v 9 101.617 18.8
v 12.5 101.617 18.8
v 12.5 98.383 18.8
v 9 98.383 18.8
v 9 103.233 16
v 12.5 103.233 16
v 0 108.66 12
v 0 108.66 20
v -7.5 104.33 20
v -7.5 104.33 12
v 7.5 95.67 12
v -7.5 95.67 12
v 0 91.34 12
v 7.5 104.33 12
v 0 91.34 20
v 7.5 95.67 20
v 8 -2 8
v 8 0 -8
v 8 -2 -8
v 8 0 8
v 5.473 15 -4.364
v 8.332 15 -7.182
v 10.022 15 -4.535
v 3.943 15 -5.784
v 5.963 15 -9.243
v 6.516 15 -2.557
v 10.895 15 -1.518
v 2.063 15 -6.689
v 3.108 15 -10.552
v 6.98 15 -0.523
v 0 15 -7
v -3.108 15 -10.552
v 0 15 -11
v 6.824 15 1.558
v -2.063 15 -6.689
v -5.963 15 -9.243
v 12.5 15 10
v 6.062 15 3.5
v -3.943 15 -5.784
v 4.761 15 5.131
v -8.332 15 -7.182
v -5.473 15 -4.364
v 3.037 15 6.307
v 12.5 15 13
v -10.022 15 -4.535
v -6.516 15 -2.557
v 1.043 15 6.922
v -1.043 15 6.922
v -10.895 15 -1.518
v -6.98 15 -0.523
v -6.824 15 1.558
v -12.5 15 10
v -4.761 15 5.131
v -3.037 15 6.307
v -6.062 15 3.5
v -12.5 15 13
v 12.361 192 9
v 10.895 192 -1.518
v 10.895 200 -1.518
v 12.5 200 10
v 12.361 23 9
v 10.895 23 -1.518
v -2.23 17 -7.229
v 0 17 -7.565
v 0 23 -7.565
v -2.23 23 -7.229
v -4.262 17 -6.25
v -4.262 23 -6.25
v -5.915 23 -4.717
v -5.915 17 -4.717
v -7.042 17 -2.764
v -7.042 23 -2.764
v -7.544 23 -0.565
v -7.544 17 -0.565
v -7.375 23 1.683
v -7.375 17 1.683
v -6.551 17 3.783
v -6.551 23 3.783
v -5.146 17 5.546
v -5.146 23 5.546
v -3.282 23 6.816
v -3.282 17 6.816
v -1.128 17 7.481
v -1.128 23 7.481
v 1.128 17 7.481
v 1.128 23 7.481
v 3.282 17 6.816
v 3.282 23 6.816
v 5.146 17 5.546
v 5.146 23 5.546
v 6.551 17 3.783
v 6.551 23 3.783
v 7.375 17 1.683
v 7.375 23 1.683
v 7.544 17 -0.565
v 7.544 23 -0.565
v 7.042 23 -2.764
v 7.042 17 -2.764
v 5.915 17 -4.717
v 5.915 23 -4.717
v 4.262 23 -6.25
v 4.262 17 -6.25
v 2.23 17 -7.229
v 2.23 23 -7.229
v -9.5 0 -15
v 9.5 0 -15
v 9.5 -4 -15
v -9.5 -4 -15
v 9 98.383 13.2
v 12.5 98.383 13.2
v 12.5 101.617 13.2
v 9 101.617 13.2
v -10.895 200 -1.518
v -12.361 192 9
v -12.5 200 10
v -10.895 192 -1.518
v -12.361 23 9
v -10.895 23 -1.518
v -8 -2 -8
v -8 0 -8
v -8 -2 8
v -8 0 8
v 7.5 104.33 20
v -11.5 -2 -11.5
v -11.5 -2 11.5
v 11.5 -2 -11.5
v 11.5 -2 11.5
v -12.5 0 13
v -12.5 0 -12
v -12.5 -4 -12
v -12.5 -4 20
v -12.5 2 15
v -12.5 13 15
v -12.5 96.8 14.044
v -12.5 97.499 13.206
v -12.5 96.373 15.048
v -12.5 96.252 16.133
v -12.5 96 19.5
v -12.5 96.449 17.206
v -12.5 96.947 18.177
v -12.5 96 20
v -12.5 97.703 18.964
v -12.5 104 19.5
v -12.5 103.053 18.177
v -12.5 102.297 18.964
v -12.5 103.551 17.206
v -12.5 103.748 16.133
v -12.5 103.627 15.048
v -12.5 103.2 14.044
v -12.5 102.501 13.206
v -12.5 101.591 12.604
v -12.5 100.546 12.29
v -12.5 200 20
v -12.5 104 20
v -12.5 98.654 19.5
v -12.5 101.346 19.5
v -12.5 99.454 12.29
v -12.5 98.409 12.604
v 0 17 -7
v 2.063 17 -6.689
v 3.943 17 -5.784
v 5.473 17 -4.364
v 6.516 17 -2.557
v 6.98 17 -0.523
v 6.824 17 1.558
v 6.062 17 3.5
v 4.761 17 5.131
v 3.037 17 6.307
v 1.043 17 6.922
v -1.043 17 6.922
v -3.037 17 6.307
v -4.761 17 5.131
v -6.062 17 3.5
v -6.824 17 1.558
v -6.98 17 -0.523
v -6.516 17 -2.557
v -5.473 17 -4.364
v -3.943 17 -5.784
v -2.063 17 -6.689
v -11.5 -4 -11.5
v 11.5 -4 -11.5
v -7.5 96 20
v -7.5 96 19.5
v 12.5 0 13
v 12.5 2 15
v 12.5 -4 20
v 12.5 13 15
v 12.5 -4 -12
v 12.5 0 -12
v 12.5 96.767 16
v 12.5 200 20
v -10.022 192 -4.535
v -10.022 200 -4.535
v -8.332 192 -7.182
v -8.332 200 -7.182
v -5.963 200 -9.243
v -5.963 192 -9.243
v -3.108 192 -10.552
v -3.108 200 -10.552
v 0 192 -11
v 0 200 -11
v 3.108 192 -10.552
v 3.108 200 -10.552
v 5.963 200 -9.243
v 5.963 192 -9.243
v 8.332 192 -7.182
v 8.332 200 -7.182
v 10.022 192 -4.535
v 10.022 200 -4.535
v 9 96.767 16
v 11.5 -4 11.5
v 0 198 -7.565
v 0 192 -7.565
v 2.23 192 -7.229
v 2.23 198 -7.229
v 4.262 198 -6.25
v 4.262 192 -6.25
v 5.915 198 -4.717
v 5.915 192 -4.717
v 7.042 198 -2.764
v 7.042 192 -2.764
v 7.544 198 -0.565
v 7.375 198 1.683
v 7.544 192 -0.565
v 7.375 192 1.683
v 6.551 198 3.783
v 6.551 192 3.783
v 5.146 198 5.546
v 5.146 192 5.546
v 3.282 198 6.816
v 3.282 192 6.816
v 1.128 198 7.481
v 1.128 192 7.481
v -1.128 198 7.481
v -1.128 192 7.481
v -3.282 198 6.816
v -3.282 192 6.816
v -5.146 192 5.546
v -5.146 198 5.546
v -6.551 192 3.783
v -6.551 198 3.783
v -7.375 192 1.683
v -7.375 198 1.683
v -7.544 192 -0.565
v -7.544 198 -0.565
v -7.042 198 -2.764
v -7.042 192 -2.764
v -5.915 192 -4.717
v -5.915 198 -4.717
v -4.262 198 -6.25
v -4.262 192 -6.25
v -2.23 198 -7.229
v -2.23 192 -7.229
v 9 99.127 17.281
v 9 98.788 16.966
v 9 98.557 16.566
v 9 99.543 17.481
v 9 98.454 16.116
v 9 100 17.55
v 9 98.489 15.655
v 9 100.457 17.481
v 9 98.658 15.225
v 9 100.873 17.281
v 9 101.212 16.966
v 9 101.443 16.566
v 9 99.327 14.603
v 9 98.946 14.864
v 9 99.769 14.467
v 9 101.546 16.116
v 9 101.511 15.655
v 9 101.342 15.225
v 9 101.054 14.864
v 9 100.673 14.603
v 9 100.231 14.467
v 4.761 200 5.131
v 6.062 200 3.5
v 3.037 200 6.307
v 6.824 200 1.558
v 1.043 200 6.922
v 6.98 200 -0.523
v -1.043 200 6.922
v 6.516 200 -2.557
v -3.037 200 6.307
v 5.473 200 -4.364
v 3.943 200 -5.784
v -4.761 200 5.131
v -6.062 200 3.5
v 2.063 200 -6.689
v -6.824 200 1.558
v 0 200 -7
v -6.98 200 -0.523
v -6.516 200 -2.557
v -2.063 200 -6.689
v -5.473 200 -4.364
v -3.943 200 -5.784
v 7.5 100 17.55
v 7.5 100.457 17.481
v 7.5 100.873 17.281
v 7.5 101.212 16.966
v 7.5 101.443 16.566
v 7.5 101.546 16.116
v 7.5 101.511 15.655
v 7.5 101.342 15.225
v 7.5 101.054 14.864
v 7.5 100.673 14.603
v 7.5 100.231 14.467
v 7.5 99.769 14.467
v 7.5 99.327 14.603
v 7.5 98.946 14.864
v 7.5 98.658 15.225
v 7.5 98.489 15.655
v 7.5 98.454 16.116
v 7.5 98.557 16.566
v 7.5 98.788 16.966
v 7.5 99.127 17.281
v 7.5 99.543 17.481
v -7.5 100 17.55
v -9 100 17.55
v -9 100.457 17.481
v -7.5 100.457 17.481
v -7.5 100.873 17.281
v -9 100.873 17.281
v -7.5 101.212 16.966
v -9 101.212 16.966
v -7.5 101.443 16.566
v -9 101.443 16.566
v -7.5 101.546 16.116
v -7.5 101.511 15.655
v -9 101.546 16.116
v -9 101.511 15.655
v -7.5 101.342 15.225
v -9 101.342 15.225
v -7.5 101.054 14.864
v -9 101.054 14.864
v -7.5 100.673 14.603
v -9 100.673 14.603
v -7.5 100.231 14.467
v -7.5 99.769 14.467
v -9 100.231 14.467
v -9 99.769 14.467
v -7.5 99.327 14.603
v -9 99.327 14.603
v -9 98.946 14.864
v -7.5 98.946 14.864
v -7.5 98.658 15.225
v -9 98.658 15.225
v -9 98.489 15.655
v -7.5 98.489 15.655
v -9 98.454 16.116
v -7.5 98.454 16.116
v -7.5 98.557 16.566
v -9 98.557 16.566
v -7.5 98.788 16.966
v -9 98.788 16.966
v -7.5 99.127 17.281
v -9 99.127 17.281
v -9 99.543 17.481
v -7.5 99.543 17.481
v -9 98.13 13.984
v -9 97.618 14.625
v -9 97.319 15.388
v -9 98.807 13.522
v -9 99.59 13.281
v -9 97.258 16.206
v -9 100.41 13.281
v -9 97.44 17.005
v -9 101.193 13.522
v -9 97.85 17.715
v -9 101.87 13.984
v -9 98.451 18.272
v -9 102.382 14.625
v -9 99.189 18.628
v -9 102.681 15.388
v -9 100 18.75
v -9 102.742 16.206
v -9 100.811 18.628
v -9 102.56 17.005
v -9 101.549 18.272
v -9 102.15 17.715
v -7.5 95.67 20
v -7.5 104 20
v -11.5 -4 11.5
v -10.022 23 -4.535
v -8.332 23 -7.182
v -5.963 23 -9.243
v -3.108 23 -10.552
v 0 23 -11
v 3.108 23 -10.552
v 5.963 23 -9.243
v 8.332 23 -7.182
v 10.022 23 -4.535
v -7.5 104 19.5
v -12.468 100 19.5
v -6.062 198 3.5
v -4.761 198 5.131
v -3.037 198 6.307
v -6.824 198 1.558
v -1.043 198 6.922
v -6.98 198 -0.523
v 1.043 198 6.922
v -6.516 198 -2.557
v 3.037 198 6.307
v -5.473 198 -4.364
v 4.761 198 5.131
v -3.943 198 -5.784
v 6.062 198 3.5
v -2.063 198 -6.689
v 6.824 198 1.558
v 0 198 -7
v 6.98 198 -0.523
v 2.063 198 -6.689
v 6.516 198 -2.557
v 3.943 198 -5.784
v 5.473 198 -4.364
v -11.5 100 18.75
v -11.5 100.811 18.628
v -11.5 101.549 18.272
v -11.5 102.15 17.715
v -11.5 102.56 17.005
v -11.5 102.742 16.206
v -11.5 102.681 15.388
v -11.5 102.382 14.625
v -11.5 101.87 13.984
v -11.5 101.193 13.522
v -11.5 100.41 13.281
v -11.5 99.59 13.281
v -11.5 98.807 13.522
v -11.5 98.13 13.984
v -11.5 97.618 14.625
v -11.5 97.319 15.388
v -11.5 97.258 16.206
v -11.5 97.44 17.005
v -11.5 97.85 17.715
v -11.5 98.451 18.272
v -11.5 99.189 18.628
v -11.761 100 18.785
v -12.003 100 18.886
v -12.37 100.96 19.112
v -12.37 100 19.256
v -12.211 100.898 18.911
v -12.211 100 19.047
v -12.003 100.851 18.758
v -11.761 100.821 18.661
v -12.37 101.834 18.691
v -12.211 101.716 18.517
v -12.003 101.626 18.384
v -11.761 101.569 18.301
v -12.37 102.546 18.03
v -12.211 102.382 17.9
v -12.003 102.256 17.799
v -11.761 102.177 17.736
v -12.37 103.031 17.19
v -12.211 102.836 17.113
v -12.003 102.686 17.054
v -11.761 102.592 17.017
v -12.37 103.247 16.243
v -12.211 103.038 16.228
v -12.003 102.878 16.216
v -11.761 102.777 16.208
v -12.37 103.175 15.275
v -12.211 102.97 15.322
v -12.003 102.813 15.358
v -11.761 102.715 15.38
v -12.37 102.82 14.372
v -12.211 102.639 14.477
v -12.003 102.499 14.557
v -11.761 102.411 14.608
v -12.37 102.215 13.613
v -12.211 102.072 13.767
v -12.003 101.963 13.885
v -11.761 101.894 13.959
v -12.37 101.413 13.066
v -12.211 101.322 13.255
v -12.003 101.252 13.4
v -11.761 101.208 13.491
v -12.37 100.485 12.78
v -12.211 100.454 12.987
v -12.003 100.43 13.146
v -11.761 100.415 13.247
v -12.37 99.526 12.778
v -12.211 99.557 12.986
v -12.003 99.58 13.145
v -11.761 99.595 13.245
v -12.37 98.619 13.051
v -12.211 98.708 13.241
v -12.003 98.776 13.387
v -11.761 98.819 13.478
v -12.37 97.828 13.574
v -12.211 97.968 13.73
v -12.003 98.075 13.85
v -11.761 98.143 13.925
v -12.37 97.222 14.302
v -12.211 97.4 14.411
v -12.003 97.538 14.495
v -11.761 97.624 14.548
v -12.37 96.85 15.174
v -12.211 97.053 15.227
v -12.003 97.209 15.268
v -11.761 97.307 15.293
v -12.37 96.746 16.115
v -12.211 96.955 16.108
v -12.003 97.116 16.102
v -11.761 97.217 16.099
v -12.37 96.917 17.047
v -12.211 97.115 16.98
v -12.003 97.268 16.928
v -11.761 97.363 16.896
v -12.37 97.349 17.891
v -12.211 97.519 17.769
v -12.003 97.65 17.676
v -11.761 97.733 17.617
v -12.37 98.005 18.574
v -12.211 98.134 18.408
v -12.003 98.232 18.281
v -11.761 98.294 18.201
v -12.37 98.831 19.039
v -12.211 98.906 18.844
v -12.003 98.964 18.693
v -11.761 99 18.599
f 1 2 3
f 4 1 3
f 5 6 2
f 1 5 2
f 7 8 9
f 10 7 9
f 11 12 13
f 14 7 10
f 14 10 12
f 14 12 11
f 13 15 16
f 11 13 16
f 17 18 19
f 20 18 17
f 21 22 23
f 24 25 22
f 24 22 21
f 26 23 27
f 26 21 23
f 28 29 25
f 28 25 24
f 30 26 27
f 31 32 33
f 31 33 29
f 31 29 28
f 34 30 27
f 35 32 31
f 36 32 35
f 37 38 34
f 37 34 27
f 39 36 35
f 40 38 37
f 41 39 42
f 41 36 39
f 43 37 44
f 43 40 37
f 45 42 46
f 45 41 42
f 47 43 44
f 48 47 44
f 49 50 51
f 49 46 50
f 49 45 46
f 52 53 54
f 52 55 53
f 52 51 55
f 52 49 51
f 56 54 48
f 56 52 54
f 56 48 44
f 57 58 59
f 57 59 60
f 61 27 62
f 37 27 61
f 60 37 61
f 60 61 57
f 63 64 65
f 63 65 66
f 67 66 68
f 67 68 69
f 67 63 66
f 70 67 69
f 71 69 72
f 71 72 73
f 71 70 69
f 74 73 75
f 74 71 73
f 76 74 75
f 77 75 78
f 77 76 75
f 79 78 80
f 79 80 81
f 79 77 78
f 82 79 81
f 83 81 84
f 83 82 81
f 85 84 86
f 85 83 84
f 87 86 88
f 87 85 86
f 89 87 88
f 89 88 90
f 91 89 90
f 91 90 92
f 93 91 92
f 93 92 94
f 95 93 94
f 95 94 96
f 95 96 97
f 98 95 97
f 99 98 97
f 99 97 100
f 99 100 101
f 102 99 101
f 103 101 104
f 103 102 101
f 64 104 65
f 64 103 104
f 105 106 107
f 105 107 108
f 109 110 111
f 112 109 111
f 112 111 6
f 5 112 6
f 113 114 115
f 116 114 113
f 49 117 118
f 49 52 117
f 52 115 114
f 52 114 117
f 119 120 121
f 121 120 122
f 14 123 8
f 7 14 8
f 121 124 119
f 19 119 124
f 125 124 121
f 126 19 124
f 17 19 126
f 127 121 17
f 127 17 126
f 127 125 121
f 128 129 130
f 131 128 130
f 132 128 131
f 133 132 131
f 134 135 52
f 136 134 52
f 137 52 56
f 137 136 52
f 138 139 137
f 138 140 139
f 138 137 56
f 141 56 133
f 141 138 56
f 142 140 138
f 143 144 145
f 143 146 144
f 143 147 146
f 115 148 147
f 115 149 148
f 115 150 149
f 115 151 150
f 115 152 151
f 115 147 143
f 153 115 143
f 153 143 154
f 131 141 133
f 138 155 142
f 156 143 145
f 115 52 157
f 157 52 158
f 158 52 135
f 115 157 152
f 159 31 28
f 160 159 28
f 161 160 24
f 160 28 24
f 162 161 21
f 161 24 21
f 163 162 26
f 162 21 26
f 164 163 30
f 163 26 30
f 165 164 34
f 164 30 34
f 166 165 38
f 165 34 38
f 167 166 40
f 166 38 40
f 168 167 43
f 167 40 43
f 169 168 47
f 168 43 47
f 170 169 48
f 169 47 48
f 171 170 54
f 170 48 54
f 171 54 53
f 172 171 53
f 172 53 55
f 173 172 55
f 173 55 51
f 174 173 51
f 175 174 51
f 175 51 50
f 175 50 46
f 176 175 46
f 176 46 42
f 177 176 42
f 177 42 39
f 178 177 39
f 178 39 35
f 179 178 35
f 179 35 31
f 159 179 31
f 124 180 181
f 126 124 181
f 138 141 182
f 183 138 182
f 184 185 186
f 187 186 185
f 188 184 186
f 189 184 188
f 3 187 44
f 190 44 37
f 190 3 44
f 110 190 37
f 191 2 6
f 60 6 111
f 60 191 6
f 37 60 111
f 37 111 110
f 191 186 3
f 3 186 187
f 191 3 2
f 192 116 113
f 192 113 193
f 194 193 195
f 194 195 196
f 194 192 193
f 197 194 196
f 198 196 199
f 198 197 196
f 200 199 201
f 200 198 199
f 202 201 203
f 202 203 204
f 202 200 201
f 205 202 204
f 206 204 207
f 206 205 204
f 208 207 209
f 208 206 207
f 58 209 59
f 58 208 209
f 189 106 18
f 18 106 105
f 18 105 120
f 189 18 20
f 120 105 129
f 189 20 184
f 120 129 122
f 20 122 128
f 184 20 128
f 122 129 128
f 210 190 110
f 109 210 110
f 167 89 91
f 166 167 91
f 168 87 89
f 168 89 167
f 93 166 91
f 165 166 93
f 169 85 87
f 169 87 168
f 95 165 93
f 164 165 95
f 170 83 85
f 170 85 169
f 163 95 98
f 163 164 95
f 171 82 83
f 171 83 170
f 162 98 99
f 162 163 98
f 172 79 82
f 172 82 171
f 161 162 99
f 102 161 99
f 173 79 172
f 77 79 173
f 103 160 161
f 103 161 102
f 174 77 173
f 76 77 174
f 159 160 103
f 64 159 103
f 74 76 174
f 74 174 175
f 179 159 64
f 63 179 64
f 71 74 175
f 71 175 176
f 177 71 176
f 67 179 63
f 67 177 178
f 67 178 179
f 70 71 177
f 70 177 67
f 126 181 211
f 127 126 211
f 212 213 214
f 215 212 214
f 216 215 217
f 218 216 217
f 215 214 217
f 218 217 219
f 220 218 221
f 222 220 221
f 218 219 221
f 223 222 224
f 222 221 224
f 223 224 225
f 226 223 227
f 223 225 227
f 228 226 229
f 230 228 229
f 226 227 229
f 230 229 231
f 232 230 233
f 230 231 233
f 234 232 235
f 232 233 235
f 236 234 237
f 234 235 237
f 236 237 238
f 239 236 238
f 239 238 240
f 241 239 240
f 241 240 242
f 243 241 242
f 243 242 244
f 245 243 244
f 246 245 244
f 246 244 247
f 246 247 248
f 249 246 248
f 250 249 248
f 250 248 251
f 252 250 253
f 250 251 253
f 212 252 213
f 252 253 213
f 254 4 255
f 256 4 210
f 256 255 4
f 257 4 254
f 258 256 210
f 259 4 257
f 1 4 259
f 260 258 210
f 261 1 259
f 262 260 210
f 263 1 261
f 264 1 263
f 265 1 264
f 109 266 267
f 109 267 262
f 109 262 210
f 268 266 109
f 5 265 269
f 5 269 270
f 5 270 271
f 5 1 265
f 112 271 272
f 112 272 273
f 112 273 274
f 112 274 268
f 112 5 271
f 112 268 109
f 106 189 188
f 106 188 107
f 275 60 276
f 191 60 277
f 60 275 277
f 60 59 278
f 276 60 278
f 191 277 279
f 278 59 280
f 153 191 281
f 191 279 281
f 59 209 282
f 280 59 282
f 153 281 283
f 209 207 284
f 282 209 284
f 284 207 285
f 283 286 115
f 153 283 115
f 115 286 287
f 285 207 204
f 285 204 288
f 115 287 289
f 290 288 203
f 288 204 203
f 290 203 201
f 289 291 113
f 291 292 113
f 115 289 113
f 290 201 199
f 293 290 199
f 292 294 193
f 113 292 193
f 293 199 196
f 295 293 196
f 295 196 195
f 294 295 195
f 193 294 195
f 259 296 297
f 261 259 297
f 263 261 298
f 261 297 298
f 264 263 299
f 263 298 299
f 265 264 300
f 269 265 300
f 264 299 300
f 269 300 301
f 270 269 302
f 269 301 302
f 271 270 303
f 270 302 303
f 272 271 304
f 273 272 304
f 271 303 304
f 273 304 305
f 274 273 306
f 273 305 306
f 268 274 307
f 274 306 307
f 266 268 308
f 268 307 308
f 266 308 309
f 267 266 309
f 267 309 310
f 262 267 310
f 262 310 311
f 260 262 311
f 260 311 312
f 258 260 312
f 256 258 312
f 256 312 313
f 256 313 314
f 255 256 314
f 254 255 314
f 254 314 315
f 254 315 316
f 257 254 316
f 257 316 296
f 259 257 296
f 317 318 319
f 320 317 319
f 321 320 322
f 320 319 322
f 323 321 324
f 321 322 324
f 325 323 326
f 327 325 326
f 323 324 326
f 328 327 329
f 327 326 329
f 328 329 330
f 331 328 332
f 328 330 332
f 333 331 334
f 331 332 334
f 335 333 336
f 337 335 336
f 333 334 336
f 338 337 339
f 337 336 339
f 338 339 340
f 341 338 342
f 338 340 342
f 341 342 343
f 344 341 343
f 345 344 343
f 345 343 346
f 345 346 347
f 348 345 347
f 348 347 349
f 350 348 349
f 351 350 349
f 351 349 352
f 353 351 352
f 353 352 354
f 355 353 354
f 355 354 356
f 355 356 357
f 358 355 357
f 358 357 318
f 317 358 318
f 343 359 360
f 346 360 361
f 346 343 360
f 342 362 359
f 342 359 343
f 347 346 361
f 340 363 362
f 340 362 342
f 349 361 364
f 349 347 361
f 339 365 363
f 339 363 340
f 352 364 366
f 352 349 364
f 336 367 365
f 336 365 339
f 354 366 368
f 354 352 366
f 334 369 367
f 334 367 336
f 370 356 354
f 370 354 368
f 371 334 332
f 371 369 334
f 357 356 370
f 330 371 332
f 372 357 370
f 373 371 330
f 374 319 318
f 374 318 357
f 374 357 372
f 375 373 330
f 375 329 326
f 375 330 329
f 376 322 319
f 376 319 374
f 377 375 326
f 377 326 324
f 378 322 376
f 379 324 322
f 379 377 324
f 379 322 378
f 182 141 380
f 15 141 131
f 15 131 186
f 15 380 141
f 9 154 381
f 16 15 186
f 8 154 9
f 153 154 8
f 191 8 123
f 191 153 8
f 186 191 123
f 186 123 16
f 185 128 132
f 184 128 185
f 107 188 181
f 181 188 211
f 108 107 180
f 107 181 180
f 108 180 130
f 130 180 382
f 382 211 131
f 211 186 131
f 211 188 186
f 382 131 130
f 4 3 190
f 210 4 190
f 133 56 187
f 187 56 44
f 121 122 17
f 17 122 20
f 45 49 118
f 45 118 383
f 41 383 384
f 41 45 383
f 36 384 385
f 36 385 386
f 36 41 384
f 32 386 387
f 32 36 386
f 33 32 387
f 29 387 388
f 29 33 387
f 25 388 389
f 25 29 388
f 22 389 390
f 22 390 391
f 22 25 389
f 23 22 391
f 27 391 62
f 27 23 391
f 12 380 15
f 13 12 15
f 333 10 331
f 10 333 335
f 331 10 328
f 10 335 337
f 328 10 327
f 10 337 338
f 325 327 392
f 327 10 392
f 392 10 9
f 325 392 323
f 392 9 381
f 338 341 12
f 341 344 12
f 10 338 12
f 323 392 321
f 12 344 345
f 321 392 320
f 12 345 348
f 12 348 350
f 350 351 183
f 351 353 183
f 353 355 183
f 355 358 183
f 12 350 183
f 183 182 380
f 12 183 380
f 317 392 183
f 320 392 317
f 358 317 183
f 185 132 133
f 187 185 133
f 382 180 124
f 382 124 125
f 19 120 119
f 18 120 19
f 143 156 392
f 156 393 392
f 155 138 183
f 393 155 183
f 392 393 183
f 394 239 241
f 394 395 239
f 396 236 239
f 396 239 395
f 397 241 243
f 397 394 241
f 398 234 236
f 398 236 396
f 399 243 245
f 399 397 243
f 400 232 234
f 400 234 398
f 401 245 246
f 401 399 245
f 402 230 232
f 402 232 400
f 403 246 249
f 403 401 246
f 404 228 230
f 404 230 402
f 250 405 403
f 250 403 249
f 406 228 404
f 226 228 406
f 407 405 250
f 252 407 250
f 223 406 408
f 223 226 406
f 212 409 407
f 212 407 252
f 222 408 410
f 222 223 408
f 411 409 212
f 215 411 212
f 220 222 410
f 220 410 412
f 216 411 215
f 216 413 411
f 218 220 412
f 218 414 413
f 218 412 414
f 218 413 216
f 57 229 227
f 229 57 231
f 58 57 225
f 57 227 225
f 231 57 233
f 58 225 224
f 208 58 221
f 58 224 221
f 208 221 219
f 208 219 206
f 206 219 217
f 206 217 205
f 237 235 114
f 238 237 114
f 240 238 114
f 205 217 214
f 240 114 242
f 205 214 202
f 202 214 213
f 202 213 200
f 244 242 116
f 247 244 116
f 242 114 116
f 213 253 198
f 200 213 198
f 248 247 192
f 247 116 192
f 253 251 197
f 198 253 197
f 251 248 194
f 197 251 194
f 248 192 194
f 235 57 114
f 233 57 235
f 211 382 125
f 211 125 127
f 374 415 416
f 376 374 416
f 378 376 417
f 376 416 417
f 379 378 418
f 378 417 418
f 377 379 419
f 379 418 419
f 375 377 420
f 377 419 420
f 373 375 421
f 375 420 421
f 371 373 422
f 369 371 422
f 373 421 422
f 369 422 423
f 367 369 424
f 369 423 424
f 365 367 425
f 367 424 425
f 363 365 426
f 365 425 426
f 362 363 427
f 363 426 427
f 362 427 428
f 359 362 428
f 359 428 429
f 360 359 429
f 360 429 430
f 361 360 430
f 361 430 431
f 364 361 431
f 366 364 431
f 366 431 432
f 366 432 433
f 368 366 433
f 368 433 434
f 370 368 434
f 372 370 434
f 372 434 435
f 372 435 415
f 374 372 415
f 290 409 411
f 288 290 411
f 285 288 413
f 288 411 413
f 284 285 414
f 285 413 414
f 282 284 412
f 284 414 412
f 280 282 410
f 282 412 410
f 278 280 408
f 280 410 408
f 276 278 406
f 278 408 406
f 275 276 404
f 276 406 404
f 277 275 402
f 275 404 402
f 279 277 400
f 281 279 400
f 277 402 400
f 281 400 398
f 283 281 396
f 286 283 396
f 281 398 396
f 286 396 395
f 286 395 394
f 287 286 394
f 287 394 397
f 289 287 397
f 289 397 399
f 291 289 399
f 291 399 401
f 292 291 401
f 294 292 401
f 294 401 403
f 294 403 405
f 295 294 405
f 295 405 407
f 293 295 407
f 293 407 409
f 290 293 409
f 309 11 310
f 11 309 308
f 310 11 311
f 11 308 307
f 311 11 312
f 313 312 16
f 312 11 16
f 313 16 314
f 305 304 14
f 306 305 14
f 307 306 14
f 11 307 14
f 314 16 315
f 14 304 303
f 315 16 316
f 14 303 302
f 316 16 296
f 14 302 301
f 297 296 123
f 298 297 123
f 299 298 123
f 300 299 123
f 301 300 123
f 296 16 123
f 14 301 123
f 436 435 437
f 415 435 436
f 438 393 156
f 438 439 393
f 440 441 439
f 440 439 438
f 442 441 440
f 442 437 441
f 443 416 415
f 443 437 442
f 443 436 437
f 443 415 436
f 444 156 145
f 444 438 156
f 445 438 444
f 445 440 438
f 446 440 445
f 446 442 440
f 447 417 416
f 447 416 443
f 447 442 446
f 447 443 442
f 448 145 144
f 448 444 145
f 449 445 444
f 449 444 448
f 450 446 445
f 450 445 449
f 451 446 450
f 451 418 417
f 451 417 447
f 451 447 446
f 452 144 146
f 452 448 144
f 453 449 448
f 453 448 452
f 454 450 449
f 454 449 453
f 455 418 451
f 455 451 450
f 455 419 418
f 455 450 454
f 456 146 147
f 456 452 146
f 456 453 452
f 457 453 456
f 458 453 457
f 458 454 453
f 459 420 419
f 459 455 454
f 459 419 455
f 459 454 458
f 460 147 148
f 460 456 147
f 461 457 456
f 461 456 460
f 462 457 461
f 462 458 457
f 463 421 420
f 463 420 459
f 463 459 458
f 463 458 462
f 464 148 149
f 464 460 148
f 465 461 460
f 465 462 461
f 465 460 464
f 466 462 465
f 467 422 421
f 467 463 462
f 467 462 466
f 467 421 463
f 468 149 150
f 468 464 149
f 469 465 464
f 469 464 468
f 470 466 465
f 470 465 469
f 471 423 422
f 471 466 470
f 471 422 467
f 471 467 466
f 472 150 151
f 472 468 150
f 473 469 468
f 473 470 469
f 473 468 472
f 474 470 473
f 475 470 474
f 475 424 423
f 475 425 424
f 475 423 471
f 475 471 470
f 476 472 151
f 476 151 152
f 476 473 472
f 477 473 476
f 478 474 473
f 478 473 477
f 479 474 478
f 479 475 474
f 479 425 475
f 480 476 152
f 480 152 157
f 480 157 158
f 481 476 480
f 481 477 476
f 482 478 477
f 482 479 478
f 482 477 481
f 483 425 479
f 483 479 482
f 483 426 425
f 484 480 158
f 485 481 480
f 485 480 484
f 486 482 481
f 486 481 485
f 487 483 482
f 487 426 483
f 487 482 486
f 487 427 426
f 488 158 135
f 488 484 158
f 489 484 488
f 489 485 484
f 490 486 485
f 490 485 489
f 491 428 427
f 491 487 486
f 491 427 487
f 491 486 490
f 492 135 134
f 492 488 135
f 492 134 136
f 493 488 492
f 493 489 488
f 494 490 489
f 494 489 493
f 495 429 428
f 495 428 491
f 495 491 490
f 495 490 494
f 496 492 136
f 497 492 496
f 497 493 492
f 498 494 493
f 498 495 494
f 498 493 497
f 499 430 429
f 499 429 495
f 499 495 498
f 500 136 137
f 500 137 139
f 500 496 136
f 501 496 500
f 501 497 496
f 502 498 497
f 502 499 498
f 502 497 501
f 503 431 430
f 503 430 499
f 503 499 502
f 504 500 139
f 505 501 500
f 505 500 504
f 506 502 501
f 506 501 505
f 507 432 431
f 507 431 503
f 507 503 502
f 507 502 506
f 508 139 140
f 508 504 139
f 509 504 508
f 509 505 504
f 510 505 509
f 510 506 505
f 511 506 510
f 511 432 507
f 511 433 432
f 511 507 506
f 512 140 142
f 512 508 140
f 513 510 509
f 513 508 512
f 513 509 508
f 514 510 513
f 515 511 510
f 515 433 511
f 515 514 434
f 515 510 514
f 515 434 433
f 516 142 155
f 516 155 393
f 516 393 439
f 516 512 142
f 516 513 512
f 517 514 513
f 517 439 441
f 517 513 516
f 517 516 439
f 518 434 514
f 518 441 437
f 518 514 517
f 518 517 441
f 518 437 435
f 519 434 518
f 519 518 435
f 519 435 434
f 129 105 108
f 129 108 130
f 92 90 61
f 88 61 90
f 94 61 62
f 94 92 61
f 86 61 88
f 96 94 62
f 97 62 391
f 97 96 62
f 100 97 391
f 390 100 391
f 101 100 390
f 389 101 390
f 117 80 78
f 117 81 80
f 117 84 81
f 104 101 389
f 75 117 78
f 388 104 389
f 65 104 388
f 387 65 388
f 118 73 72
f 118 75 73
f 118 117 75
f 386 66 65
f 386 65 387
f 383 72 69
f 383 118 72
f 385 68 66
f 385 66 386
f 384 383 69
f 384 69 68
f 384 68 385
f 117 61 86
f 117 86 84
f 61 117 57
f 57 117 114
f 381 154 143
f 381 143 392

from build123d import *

# Parameters (mm, degrees)
BOSS_EXTRUDE1_DEPTH = 200
SKETCH4_R           = 7
CUT_EXTRUDE2_DEPTH  = 200
SKETCH3_W           = 20
SKETCH3_H           = 169
SKETCH3_W_2         = 21
SKETCH3_H_2         = 15
CUT_EXTRUDE1_DEPTH  = 100
SKETCH5_R           = 7.565
CUT_EXTRUDE3_DEPTH  = 6
CUT_EXTRUDE4_START  = -6
SKETCH6_R           = 7.565
CUT_EXTRUDE4_DEPTH  = 6
CUT_EXTRUDE8_START  = -100
SKETCH11_W          = 7
SKETCH11_H          = 2
CUT_EXTRUDE8_DEPTH  = 4
SKETCH13_W          = 16
SKETCH13_H          = 16
BOSS_EXTRUDE3_DEPTH = 4
SKETCH14_W          = 5
SKETCH14_H          = 15
CUT_EXTRUDE11_DEPTH = 203.546291005
CHAMFER1_SIZE       = 2
SKETCH15_W          = 23
SKETCH15_H          = 23
CUT_EXTRUDE12_DEPTH = 2
CUT_EXTRUDE13_DEPTH = 8
SKETCH17_R          = 1.55
CUT_EXTRUDE14_DEPTH = 203.546291005
SKETCH18_R          = 2.75
CUT_EXTRUDE15_DEPTH = 3.5
CUT_EXTRUDE16_DEPTH = 3.5
FILLET2_R           = 1


with BuildPart() as part:
    # Sketch1 → Boss-Extrude1 (new body)
    with BuildSketch(Plane(origin=(0, 0, 0), x_dir=(1, 0, 0), z_dir=(0, 1, 0))):
        with BuildLine():
            Line((-12.5, -10), (-10.894701926, 1.518377407))
            ThreePointArc((-10.894701926, 1.518377407), (0, 11), (10.894701926, 1.518377407))
            Line((10.894701926, 1.518377407), (12.5, -10))
            Line((12.5, -10), (12.5, -20))
            Line((12.5, -20), (-12.5, -20))
            Line((-12.5, -20), (-12.5, -10))
        make_face()
    extrude(amount=BOSS_EXTRUDE1_DEPTH)

    # Sketch4 → Cut-Extrude2 (cut)
    with BuildSketch(Plane.XZ):
        with Locations(Location((0, 0, 0), (0, 0, 270))):
            Circle(SKETCH4_R)
    extrude(amount=-CUT_EXTRUDE2_DEPTH, mode=Mode.SUBTRACT)

    # Sketch3 → Cut-Extrude1 (cut, symmetric)
    with BuildSketch(Plane(origin=(0, 0, 0), x_dir=(0, 0, -1), z_dir=(1, 0, 0))):
        with Locations((1, 107.5)):
            Rectangle(SKETCH3_W, SKETCH3_H)
        with Locations((0.5, 7.5)):
            Rectangle(SKETCH3_W_2, SKETCH3_H_2)
    extrude(amount=CUT_EXTRUDE1_DEPTH, both=True, mode=Mode.SUBTRACT)

    # Sketch5 → Cut-Extrude3 (cut)
    with BuildSketch(Plane.XZ.offset(-192)):
        with Locations(Location((0, 0, 0), (0, 0, 270))):
            Circle(SKETCH5_R)
    extrude(amount=-CUT_EXTRUDE3_DEPTH, mode=Mode.SUBTRACT)

    # Sketch6 → Cut-Extrude4 (cut)
    with BuildSketch(Plane(origin=(0, 23, 0), x_dir=(1, 0, 0), z_dir=(0, 1, 0)).offset(CUT_EXTRUDE4_START)):
        with Locations(Location((0, 0, 0), (0, 0, 90))):
            Circle(SKETCH6_R)
    extrude(amount=CUT_EXTRUDE4_DEPTH, mode=Mode.SUBTRACT)

    # Sketch11 → Cut-Extrude8 (cut, symmetric)
    with BuildSketch(Plane.XZ.offset(CUT_EXTRUDE8_START)):
        with Locations((-9, 20.5)):
            Rectangle(SKETCH11_W, SKETCH11_H)
    extrude(amount=CUT_EXTRUDE8_DEPTH, both=True, mode=Mode.SUBTRACT)

    # Sketch13 → Boss-Extrude3 (add)
    with BuildSketch(Plane.XZ):
        Polygon((-12.5, 20), (12.5, 20), (12.5, -12), (9.5, -15), (-9.5, -15), (-12.5, -12), align=None)
        Rectangle(SKETCH13_W, SKETCH13_H, mode=Mode.SUBTRACT)
    extrude(amount=BOSS_EXTRUDE3_DEPTH)

    # Sketch14 → Cut-Extrude11 (cut, through all)
    with BuildSketch(Plane.ZY.offset(12.5)):
        with Locations((12.5, 7.5)):
            Rectangle(SKETCH14_W, SKETCH14_H)
    extrude(amount=-CUT_EXTRUDE11_DEPTH, mode=Mode.SUBTRACT)

    # Chamfer1
    chamfer1_edges = [part.edges().sort_by_distance(p)[0] for p in [
        (0, 15, 15),
        (0, 0, 15),
    ]]
    chamfer(chamfer1_edges, length=CHAMFER1_SIZE)

    # Sketch15 → Cut-Extrude12 (cut)
    with BuildSketch(Plane.XZ.offset(4)):
        Rectangle(SKETCH15_W, SKETCH15_H)
    extrude(amount=-CUT_EXTRUDE12_DEPTH, mode=Mode.SUBTRACT)

    # Sketch16 → Cut-Extrude13 (cut)
    with BuildSketch(Plane.XY.offset(20)):
        Polygon((0, 108.660254038), (-7.5, 104.330127019), (-7.5, 95.669872981), (0, 91.339745962), (7.5, 95.669872981), (7.5, 104.330127019), align=None)
    extrude(amount=-CUT_EXTRUDE13_DEPTH, mode=Mode.SUBTRACT)

    # Sketch17 → Cut-Extrude14 (cut, through all)
    with BuildSketch(Plane.ZY.offset(12.5)):
        with Locations((16, 100)):
            Circle(SKETCH17_R)
    extrude(amount=-CUT_EXTRUDE14_DEPTH, mode=Mode.SUBTRACT)

    # Sketch18 → Cut-Extrude15 (cut)
    with BuildSketch(Plane.ZY.offset(12.5)):
        with Locations((16, 100)):
            Circle(SKETCH18_R)
    extrude(amount=-CUT_EXTRUDE15_DEPTH, mode=Mode.SUBTRACT)

    # Sketch19 → Cut-Extrude16 (cut)
    with BuildSketch(Plane(origin=(12.5, 0, 0), x_dir=(0, 0, -1), z_dir=(1, 0, 0))):
        Polygon((-16, 103.233161507), (-18.8, 101.616580754), (-18.8, 98.383419246), (-16, 96.766838493), (-13.2, 98.383419246), (-13.2, 101.616580754), align=None)
    extrude(amount=-CUT_EXTRUDE16_DEPTH, mode=Mode.SUBTRACT)

    # Fillet2
    # the kernel refuses this fillet: 1 mm, written as the material it takes off along each edge
    with BuildSketch(Plane(origin=(-12.5, 100, 16), x_dir=(0, 0, 1), z_dir=(0, -1, 0))) as fillet2_piece_1:
        with BuildLine():
            CenterArc((2.75 + FILLET2_R, -FILLET2_R), FILLET2_R, 90, 90)
            Line((2.75, -FILLET2_R), (2.75, 0))
            Line((2.75, 0), (2.75 + FILLET2_R, 0))
        make_face()
    revolve(axis=Axis((-12.5, 100, 16), (-1, 0, 0)), mode=Mode.SUBTRACT)


solid = part.part
